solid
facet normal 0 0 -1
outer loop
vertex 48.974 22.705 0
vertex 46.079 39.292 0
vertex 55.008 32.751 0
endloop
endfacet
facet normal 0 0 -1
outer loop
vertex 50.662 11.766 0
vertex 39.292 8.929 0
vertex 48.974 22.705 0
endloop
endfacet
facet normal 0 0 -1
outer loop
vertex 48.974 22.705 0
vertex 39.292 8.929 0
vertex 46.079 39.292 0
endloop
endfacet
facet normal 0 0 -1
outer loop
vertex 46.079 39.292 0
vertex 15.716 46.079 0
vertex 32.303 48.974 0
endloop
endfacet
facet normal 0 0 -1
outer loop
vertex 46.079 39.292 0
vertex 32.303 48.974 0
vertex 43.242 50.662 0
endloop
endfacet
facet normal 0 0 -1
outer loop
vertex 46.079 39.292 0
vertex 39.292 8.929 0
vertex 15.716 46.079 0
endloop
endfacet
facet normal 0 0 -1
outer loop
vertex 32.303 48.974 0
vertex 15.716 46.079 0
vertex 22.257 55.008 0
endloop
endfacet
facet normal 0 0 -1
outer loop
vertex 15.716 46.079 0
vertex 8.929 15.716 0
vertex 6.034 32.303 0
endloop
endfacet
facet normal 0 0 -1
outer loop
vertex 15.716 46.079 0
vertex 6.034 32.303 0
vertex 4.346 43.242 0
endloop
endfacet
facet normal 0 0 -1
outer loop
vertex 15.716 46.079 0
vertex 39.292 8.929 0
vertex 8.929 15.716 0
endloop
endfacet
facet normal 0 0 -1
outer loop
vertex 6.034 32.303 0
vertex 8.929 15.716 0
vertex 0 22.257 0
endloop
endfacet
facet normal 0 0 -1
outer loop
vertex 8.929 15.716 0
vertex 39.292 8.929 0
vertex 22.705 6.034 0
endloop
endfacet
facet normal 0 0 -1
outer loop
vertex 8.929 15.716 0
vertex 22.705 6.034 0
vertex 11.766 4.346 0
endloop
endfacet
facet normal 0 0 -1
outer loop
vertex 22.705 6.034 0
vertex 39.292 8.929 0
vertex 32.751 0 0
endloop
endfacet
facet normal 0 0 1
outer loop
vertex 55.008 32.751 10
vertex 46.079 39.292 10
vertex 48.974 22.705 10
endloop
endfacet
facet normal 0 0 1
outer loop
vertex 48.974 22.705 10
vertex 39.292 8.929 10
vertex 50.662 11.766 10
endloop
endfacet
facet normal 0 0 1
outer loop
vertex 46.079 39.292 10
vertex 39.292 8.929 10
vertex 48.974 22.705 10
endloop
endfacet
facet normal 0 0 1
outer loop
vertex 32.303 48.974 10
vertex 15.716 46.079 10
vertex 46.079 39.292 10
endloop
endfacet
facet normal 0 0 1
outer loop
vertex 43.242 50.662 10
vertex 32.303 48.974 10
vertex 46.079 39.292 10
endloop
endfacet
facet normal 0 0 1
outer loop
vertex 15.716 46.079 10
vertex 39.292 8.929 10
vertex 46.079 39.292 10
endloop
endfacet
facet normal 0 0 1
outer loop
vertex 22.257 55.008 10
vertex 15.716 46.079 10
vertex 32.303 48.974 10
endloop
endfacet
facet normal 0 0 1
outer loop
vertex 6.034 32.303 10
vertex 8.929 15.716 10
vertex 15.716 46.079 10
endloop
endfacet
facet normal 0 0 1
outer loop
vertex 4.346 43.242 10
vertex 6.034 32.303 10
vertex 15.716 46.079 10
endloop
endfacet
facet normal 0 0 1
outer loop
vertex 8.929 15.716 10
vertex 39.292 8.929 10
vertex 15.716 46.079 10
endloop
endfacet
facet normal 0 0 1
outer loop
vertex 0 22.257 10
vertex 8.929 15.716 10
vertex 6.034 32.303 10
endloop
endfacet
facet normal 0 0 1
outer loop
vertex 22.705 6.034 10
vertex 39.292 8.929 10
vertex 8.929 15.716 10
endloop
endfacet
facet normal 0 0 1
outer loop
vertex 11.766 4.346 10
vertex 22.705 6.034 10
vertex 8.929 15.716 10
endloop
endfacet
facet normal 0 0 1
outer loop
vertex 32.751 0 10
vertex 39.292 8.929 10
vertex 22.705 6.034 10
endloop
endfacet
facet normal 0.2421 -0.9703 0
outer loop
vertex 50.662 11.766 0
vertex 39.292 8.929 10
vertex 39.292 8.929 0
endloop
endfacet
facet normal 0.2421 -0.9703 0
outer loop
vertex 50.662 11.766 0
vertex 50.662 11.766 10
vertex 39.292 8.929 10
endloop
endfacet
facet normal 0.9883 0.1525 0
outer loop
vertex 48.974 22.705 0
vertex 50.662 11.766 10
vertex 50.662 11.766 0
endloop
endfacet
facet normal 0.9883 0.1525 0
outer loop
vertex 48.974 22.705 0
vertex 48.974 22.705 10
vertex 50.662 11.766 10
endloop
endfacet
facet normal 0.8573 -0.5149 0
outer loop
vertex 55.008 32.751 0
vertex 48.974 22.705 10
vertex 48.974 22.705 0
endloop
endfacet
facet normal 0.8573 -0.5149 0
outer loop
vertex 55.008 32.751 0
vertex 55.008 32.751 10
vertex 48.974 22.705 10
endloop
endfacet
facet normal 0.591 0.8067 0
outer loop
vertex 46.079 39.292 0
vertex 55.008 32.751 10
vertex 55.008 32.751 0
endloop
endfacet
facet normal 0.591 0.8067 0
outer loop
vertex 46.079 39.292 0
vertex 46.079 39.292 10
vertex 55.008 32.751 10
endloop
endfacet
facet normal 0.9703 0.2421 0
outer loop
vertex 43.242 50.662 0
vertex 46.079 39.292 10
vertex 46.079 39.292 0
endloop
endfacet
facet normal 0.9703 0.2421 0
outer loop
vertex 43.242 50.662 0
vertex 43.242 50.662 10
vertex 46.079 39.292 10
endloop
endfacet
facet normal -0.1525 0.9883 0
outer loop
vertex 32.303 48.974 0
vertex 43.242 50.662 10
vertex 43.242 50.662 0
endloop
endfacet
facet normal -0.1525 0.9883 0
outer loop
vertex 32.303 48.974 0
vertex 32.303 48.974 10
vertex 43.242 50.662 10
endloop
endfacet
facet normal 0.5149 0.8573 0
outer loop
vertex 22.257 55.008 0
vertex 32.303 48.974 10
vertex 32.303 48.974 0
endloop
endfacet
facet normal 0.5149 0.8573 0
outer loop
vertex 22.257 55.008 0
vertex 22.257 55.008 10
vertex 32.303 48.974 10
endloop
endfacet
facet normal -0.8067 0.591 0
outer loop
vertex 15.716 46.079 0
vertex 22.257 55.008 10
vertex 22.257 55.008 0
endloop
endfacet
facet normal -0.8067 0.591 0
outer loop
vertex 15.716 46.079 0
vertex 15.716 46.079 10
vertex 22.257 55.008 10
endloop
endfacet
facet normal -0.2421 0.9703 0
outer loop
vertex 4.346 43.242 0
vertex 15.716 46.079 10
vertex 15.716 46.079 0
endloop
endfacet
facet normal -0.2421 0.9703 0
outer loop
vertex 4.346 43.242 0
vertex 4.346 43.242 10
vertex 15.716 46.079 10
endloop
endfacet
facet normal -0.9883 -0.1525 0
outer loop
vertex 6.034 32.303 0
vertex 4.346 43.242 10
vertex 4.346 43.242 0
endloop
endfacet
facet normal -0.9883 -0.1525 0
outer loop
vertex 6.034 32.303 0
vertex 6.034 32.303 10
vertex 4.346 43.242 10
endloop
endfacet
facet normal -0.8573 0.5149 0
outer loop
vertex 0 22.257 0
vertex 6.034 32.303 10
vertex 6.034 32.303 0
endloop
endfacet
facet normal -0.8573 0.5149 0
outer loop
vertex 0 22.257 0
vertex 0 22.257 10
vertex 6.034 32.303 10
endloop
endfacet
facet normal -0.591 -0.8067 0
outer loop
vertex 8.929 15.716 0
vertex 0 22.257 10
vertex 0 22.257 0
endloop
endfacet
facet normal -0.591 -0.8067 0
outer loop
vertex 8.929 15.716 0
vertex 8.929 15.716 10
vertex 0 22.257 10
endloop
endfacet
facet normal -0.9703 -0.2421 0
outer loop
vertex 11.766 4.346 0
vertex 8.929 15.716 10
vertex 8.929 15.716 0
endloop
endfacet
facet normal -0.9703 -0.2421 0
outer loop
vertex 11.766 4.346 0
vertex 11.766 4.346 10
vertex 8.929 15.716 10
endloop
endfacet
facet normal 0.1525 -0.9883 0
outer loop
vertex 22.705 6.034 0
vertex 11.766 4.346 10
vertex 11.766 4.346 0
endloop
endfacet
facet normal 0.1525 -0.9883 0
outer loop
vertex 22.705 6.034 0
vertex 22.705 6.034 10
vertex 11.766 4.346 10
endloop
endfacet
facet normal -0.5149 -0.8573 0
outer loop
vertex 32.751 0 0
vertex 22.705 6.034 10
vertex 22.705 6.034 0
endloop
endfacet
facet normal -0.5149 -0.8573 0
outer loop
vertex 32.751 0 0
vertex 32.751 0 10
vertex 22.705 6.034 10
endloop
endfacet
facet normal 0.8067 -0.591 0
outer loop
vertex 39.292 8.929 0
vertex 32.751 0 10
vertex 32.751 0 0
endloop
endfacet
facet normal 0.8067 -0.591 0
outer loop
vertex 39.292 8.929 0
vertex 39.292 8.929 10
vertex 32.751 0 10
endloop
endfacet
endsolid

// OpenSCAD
$fn = 32;

// ----------------------------------------------------------------------
// Chain sprocket: 8 teeth, 22 mm root radius
// ----------------------------------------------------------------------

// --- parameters (mm) ---
profile_height = 10;      // extrusion height
profile_points = 16;      // points of the closed outline

profile = [[48.974, 22.705], [55.008, 32.751], [46.079, 39.292], [43.242, 50.662], [32.303, 48.974], [22.257, 55.008], [15.716, 46.079], [4.346, 43.242], [6.034, 32.303], [0, 22.257], [8.929, 15.716], [11.766, 4.346], [22.705, 6.034], [32.751, 0], [39.292, 8.929], [50.662, 11.766]];  // single closed polygon, 16 points, counter clockwise

// --- the one profile operation ---
linear_extrude(height = profile_height) polygon(points = profile);
